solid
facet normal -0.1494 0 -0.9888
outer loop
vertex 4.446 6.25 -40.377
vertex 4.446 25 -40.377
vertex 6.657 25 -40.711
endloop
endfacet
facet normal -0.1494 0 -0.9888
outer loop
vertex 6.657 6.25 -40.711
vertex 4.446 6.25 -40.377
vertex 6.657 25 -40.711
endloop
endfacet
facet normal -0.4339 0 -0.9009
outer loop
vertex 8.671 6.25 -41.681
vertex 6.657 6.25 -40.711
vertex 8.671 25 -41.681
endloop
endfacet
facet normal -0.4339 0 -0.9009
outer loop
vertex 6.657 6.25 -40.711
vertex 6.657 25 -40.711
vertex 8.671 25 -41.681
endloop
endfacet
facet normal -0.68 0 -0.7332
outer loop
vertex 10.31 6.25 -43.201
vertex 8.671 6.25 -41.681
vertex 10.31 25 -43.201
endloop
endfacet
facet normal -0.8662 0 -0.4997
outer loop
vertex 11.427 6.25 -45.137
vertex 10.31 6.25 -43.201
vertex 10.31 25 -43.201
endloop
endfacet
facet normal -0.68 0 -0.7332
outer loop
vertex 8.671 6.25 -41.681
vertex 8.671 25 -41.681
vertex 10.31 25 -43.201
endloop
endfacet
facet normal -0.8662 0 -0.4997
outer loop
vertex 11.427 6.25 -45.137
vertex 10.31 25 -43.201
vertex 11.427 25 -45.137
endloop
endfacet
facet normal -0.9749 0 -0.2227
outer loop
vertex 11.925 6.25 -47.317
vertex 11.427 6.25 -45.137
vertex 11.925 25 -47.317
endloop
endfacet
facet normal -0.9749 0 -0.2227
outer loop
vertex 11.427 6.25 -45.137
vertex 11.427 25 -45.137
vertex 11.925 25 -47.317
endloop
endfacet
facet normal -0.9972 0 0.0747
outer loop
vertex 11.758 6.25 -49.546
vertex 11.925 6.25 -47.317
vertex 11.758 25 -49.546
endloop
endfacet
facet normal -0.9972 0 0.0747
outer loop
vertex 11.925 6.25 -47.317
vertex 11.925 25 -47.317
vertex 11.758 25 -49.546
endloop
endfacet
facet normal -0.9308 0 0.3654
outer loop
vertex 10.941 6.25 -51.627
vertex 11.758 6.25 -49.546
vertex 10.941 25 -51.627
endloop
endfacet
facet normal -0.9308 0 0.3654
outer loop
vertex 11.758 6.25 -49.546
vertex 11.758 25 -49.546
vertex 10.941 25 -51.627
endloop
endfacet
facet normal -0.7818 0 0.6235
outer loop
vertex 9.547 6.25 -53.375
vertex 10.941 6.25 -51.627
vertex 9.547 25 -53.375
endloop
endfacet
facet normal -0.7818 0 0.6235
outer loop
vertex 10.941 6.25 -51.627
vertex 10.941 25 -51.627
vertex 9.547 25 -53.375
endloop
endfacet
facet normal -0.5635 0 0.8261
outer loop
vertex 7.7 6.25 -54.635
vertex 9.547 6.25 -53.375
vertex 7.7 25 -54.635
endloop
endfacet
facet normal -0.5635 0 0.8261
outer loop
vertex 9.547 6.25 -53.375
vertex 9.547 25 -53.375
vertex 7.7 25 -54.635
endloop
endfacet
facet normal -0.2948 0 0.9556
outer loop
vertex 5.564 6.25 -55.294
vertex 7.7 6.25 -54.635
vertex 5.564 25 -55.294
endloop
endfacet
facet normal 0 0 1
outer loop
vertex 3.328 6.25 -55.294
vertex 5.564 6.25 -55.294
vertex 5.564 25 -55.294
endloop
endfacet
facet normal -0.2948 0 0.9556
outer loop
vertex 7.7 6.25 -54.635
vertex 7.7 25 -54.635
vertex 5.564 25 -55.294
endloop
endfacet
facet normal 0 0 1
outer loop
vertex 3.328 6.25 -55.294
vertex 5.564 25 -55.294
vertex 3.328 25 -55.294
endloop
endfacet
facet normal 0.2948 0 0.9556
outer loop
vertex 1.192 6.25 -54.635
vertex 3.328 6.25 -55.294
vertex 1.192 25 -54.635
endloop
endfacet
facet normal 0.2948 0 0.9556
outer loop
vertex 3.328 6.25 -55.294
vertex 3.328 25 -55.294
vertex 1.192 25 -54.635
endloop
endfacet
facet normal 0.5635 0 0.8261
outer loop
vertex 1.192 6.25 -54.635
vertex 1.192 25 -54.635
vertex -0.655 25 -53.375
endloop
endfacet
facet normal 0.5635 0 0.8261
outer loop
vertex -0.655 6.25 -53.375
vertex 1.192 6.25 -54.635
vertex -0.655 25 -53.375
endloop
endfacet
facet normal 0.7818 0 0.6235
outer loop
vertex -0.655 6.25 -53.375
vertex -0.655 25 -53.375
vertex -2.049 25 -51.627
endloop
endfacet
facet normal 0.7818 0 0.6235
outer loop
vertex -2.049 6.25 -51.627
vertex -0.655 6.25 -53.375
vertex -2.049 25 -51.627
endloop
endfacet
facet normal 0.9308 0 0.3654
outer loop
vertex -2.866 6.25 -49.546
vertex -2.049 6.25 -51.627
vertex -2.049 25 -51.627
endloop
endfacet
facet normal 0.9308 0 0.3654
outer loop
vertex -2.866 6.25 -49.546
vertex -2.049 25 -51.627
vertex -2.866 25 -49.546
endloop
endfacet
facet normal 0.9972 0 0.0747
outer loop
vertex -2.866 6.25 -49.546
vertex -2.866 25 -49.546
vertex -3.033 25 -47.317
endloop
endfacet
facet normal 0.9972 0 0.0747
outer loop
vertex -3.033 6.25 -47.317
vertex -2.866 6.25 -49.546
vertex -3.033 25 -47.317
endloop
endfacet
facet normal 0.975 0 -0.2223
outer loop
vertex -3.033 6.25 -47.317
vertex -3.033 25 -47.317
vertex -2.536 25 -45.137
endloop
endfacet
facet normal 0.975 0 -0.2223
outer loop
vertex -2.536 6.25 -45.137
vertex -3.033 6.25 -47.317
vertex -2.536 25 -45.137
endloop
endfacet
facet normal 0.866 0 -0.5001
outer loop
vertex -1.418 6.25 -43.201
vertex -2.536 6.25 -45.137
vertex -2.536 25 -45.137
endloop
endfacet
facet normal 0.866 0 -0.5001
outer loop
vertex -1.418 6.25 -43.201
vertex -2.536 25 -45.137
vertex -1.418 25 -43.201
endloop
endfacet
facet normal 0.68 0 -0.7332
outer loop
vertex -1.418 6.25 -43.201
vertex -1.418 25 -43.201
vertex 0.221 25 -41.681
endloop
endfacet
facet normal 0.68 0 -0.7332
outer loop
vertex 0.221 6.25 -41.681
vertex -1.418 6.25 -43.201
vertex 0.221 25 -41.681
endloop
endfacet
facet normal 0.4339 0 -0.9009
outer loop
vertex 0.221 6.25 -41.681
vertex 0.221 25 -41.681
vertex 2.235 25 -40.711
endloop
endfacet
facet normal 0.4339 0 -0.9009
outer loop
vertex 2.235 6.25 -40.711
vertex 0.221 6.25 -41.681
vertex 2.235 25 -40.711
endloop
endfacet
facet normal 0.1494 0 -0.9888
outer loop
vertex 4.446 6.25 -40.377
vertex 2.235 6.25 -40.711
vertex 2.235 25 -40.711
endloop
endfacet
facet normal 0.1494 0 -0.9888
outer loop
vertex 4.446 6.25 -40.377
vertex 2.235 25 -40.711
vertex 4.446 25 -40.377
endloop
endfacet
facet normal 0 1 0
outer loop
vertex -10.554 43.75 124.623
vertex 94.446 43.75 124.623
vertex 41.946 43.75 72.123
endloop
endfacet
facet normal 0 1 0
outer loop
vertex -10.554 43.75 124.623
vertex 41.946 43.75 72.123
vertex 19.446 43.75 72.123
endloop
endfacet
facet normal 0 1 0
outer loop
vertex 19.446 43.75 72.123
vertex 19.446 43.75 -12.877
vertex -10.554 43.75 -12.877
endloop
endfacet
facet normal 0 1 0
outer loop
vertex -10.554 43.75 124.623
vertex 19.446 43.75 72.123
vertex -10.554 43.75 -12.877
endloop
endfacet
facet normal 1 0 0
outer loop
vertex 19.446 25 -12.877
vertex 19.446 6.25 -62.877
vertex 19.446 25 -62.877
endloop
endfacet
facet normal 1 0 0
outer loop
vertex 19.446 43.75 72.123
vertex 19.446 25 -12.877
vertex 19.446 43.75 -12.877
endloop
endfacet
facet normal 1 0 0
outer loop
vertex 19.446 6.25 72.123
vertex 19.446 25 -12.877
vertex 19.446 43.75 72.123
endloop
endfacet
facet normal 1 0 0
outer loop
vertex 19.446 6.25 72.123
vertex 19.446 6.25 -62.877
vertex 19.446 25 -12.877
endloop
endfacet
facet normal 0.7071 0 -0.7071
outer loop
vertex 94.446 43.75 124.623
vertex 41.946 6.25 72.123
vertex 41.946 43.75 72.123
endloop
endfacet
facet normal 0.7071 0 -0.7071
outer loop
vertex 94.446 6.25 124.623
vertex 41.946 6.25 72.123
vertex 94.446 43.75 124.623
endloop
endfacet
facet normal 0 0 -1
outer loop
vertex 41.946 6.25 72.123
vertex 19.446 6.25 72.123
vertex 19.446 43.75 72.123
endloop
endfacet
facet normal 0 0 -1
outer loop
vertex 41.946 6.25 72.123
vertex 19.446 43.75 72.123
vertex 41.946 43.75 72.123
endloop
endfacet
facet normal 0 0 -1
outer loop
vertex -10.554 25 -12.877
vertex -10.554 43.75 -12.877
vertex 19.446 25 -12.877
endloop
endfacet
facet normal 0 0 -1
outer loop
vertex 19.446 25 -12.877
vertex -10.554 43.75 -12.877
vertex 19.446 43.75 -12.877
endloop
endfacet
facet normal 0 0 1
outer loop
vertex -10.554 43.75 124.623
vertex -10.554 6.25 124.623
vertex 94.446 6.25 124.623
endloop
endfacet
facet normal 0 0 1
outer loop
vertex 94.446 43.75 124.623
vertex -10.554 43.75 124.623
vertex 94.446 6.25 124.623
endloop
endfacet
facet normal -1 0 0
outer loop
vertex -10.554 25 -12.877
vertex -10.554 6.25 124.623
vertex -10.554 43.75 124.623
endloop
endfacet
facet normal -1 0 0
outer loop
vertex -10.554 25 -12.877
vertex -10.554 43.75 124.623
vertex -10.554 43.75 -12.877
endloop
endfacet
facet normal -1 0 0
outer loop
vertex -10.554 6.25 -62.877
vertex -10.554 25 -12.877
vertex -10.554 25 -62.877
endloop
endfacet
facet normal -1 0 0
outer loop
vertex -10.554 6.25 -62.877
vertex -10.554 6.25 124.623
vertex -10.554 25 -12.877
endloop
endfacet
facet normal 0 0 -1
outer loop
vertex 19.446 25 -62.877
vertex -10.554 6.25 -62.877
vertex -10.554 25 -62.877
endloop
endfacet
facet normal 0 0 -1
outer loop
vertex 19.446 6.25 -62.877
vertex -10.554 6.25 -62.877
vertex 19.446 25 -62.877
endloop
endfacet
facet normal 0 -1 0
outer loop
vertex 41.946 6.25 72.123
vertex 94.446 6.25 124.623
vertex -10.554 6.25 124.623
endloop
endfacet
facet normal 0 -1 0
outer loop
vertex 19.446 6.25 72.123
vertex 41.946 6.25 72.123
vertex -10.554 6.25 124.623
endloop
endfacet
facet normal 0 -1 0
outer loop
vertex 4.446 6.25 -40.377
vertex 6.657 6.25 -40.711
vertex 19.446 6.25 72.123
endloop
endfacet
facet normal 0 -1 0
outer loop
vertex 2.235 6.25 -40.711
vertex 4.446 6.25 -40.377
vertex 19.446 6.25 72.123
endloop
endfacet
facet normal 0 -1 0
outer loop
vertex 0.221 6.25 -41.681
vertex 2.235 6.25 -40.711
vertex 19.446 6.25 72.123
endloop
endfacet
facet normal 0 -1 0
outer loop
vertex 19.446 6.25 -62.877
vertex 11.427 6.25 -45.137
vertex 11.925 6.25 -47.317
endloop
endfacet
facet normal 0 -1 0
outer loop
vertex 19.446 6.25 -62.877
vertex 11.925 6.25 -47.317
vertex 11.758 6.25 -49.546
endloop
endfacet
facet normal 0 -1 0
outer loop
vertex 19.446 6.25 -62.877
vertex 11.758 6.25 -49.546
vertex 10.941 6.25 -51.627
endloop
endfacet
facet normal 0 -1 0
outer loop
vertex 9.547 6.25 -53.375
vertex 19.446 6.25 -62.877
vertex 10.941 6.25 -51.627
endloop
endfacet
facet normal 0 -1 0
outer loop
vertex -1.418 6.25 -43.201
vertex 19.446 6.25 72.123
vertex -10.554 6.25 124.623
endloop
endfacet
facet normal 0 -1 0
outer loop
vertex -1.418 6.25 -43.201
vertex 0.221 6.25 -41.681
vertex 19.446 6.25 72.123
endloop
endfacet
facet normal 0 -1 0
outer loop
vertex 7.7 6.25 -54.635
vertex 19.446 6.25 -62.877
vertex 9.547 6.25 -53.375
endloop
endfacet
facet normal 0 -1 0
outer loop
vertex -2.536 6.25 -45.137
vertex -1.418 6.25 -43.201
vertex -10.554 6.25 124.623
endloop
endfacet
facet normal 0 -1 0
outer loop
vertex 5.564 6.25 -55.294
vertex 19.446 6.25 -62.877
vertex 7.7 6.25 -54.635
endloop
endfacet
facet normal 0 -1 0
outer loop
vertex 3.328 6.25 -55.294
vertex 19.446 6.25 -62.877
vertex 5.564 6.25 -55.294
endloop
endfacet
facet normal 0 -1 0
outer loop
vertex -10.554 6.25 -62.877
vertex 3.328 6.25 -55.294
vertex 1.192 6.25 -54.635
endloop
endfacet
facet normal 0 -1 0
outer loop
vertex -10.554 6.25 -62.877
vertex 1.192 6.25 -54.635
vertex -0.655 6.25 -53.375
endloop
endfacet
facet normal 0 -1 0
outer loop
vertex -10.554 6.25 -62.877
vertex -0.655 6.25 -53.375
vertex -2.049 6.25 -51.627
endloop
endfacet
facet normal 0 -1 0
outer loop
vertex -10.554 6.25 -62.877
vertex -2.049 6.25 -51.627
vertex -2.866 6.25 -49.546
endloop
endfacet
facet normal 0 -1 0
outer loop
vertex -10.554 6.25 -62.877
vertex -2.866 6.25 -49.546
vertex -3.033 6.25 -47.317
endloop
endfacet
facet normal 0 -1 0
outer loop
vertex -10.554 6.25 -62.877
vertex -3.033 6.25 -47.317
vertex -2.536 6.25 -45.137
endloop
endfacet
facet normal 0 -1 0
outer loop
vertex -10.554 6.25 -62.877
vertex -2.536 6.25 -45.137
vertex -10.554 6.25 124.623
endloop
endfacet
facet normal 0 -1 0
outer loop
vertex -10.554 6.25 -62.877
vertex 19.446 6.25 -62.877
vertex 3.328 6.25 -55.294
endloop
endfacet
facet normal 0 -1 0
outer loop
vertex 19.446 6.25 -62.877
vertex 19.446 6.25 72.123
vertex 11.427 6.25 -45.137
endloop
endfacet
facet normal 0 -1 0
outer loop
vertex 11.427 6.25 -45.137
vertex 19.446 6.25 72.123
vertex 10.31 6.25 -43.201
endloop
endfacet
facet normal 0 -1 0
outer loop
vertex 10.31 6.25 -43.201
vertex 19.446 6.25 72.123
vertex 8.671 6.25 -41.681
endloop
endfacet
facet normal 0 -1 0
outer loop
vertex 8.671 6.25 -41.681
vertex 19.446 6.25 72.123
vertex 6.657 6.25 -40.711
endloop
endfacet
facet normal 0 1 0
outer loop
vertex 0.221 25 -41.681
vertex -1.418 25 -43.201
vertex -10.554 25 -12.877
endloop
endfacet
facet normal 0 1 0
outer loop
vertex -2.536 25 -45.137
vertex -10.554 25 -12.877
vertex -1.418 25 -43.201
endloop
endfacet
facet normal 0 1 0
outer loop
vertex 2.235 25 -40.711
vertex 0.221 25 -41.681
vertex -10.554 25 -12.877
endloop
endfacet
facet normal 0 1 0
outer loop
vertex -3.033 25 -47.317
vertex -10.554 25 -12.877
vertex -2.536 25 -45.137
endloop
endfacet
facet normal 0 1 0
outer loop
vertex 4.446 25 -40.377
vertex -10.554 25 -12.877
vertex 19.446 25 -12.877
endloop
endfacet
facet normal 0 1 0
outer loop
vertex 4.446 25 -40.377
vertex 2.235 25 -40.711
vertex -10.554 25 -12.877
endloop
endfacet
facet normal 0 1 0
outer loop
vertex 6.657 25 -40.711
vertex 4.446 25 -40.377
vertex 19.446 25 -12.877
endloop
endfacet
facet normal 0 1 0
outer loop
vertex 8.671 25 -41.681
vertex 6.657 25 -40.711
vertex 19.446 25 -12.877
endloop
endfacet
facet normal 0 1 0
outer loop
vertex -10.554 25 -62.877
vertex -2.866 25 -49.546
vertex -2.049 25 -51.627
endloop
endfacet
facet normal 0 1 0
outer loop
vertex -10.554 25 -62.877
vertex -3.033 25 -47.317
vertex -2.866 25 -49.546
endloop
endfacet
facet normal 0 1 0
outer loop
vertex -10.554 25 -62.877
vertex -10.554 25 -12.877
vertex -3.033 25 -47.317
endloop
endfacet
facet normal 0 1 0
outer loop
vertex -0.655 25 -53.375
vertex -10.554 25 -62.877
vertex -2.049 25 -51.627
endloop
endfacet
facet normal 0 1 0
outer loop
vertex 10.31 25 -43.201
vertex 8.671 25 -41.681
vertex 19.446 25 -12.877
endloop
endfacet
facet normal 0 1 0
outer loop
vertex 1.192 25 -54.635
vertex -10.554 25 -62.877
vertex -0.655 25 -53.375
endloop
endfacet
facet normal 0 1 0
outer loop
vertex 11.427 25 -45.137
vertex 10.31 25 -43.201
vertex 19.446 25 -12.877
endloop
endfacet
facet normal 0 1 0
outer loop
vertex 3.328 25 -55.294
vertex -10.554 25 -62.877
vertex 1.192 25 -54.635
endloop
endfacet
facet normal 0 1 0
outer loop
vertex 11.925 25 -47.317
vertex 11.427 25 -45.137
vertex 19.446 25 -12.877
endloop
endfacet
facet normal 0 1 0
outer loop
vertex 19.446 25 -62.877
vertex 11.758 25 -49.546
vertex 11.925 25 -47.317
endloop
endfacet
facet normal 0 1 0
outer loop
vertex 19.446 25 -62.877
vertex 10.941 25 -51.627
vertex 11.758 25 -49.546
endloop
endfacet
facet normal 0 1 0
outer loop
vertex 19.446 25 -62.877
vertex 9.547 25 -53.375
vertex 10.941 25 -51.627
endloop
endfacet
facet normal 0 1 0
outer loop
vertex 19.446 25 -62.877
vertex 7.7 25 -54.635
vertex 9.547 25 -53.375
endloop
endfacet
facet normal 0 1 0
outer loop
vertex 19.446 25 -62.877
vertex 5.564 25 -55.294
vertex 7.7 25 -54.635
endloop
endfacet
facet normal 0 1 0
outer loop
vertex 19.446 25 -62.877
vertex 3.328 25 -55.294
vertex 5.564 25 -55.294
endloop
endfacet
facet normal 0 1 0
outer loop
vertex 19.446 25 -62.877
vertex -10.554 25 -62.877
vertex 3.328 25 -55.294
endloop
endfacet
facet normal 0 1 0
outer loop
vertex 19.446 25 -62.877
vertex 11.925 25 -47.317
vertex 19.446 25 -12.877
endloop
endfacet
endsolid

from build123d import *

# Parameters (mm, degrees)
BOSS_EXTRUDE1_DEPTH = 50
SKETCH2_R           = 10
CUT_EXTRUDE1_DEPTH  = 77
SCALE1_SCALE        = 0.75
SKETCH4_W           = 30
SKETCH4_H           = 50
CUT_EXTRUDE2_DEPTH  = 18.75


with BuildPart() as part:
    # Sketch1 → Boss-Extrude1 (new body)
    with BuildSketch(Plane(origin=(0, 0, 0), x_dir=(1, 0, 0), z_dir=(0, 1, 0))):
        Polygon((50, -77.599909443), (120, -147.599909443), (50, -147.599909443), (-20, -147.599909443), (-20, 102.400090557), (20, 102.400090557), (20, -77.599909443), align=None)
    extrude(amount=BOSS_EXTRUDE1_DEPTH)

    # Sketch2 → Cut-Extrude1 (cut)
    with BuildSketch(Plane(origin=(0, 50, 0), x_dir=(1, 0, 0), z_dir=(0, 1, 0))):
        with Locations(Location((0, 82.400090557, 0), (0, 0, 270))):
            Circle(SKETCH2_R)
    extrude(amount=-CUT_EXTRUDE1_DEPTH, mode=Mode.SUBTRACT)


with BuildPart() as part_1:
    # Scale1: scaled about (17.783752388, 25, 55.690336976)
    add(part.part.scale(SCALE1_SCALE).moved(Location((4.445938097, 6.25, 13.922584244))))

    # Sketch4 → Cut-Extrude2 (cut)
    with BuildSketch(Plane(origin=(0, 43.75, 0), x_dir=(1, 0, 0), z_dir=(0, 1, 0))):
        with Locations((4.445938097, 37.877483673)):
            Rectangle(SKETCH4_W, SKETCH4_H)
    extrude(amount=-CUT_EXTRUDE2_DEPTH, mode=Mode.SUBTRACT)


solid = part_1.part
